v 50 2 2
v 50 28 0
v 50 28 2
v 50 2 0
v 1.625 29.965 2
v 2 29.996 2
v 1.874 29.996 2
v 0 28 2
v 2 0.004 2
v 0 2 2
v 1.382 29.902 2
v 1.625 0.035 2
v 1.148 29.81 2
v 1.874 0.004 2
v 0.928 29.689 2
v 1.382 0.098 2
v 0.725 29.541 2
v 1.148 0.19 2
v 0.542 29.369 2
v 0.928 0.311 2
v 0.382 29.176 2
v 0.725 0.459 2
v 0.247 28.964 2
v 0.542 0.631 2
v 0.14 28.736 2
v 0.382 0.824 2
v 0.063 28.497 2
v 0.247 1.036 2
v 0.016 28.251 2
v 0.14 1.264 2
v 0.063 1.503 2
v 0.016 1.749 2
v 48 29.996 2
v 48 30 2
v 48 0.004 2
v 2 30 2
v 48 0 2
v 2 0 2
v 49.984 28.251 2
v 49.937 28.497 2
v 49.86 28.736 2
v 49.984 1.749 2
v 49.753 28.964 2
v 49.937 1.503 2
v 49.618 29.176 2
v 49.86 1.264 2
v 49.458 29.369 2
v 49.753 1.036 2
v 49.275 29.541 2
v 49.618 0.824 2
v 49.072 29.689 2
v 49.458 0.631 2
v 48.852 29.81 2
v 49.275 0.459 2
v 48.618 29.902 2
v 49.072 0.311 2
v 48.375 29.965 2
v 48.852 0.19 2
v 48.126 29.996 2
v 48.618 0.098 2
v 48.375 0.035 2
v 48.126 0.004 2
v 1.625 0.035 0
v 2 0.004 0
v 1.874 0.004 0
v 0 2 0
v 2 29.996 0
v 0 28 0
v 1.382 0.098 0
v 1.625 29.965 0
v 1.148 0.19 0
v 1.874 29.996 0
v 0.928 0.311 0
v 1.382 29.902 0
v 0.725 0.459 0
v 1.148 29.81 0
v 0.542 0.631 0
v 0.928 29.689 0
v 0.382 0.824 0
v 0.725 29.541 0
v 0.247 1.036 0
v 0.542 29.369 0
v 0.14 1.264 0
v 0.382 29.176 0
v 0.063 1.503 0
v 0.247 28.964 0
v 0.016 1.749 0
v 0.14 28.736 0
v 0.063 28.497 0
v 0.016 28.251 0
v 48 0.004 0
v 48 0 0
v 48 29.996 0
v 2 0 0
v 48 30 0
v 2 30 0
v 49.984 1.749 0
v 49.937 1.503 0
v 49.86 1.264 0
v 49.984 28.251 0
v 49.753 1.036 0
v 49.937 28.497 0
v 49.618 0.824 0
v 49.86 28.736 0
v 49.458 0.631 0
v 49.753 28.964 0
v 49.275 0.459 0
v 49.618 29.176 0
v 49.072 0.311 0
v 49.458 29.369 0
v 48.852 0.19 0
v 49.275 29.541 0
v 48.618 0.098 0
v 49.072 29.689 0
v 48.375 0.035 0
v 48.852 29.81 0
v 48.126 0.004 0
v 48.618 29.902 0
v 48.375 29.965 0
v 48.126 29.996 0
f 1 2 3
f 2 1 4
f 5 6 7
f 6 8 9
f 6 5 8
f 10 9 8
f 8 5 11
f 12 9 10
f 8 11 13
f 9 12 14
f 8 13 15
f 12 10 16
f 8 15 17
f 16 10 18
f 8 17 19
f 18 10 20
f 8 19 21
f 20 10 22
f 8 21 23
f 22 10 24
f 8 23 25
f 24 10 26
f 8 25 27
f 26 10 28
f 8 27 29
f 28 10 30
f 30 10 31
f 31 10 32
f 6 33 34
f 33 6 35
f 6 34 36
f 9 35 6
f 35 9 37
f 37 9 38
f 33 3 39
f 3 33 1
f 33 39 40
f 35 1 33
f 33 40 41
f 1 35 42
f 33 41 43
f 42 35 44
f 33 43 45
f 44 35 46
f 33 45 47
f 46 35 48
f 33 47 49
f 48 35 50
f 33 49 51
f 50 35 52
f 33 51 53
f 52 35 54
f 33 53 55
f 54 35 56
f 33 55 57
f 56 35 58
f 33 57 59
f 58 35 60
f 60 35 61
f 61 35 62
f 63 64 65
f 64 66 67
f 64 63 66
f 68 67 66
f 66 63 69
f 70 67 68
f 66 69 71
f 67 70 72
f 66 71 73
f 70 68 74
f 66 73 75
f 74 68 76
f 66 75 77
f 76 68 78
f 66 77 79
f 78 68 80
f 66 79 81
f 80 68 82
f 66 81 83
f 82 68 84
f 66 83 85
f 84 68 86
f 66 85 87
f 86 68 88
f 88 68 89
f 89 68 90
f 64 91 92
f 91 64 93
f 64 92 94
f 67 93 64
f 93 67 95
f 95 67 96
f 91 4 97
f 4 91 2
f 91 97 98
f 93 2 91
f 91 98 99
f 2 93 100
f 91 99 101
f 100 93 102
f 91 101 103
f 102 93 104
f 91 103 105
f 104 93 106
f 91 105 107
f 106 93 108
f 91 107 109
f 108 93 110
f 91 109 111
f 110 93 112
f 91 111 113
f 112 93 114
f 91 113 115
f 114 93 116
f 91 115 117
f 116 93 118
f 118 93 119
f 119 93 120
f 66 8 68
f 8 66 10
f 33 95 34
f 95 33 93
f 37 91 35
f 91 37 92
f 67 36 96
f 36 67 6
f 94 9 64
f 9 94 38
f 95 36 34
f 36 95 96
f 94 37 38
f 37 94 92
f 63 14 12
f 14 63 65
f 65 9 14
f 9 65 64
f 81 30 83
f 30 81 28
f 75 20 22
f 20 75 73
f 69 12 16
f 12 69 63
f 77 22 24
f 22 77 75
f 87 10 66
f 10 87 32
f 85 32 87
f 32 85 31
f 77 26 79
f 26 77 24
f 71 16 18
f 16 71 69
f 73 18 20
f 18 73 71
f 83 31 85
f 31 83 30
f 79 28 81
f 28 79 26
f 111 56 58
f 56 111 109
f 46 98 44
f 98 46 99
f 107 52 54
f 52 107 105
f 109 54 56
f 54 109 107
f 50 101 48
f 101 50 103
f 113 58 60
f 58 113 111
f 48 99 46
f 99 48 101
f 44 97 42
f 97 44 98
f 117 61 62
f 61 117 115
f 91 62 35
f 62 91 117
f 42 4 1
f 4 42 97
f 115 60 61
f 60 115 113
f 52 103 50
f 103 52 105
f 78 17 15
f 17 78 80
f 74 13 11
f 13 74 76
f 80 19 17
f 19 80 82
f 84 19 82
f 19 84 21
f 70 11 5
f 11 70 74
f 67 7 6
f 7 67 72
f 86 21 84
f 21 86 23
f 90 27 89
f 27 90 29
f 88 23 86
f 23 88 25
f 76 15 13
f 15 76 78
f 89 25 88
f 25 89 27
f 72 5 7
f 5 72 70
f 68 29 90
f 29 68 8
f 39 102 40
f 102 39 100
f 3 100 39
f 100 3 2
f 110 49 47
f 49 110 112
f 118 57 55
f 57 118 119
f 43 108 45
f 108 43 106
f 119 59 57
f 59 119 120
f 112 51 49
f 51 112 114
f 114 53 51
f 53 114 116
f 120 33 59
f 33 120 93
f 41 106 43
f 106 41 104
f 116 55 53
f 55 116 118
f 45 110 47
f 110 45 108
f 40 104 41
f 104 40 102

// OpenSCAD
// parameters
X = 50;
Y = 30;
THICKNESS = 2;
R = 2;
RESOLUTION = 50;

module RoundedRectangle(x, y, thickness, r, $fn=0) {

    translate([0, r, 0])
        cube([x, y-2*r, thickness]);
    translate([r, 0, 0])
        cube([x-2*r, y, thickness]);

    translate([r, r, 0])
        cylinder(r=r, h=thickness, $fn=$fn);
    translate([x-r, r, 0])
        cylinder(r=r, h=thickness, $fn=$fn);
    translate([r, y-r, 0])
        cylinder(r=r, h=thickness, $fn=$fn);
    translate([x-r, y-r, 0])
        cylinder(r=r, h=thickness, $fn=$fn);

}

// main
RoundedRectangle(x=X, y=Y, thickness=THICKNESS, r=R, $fn=RESOLUTION);
